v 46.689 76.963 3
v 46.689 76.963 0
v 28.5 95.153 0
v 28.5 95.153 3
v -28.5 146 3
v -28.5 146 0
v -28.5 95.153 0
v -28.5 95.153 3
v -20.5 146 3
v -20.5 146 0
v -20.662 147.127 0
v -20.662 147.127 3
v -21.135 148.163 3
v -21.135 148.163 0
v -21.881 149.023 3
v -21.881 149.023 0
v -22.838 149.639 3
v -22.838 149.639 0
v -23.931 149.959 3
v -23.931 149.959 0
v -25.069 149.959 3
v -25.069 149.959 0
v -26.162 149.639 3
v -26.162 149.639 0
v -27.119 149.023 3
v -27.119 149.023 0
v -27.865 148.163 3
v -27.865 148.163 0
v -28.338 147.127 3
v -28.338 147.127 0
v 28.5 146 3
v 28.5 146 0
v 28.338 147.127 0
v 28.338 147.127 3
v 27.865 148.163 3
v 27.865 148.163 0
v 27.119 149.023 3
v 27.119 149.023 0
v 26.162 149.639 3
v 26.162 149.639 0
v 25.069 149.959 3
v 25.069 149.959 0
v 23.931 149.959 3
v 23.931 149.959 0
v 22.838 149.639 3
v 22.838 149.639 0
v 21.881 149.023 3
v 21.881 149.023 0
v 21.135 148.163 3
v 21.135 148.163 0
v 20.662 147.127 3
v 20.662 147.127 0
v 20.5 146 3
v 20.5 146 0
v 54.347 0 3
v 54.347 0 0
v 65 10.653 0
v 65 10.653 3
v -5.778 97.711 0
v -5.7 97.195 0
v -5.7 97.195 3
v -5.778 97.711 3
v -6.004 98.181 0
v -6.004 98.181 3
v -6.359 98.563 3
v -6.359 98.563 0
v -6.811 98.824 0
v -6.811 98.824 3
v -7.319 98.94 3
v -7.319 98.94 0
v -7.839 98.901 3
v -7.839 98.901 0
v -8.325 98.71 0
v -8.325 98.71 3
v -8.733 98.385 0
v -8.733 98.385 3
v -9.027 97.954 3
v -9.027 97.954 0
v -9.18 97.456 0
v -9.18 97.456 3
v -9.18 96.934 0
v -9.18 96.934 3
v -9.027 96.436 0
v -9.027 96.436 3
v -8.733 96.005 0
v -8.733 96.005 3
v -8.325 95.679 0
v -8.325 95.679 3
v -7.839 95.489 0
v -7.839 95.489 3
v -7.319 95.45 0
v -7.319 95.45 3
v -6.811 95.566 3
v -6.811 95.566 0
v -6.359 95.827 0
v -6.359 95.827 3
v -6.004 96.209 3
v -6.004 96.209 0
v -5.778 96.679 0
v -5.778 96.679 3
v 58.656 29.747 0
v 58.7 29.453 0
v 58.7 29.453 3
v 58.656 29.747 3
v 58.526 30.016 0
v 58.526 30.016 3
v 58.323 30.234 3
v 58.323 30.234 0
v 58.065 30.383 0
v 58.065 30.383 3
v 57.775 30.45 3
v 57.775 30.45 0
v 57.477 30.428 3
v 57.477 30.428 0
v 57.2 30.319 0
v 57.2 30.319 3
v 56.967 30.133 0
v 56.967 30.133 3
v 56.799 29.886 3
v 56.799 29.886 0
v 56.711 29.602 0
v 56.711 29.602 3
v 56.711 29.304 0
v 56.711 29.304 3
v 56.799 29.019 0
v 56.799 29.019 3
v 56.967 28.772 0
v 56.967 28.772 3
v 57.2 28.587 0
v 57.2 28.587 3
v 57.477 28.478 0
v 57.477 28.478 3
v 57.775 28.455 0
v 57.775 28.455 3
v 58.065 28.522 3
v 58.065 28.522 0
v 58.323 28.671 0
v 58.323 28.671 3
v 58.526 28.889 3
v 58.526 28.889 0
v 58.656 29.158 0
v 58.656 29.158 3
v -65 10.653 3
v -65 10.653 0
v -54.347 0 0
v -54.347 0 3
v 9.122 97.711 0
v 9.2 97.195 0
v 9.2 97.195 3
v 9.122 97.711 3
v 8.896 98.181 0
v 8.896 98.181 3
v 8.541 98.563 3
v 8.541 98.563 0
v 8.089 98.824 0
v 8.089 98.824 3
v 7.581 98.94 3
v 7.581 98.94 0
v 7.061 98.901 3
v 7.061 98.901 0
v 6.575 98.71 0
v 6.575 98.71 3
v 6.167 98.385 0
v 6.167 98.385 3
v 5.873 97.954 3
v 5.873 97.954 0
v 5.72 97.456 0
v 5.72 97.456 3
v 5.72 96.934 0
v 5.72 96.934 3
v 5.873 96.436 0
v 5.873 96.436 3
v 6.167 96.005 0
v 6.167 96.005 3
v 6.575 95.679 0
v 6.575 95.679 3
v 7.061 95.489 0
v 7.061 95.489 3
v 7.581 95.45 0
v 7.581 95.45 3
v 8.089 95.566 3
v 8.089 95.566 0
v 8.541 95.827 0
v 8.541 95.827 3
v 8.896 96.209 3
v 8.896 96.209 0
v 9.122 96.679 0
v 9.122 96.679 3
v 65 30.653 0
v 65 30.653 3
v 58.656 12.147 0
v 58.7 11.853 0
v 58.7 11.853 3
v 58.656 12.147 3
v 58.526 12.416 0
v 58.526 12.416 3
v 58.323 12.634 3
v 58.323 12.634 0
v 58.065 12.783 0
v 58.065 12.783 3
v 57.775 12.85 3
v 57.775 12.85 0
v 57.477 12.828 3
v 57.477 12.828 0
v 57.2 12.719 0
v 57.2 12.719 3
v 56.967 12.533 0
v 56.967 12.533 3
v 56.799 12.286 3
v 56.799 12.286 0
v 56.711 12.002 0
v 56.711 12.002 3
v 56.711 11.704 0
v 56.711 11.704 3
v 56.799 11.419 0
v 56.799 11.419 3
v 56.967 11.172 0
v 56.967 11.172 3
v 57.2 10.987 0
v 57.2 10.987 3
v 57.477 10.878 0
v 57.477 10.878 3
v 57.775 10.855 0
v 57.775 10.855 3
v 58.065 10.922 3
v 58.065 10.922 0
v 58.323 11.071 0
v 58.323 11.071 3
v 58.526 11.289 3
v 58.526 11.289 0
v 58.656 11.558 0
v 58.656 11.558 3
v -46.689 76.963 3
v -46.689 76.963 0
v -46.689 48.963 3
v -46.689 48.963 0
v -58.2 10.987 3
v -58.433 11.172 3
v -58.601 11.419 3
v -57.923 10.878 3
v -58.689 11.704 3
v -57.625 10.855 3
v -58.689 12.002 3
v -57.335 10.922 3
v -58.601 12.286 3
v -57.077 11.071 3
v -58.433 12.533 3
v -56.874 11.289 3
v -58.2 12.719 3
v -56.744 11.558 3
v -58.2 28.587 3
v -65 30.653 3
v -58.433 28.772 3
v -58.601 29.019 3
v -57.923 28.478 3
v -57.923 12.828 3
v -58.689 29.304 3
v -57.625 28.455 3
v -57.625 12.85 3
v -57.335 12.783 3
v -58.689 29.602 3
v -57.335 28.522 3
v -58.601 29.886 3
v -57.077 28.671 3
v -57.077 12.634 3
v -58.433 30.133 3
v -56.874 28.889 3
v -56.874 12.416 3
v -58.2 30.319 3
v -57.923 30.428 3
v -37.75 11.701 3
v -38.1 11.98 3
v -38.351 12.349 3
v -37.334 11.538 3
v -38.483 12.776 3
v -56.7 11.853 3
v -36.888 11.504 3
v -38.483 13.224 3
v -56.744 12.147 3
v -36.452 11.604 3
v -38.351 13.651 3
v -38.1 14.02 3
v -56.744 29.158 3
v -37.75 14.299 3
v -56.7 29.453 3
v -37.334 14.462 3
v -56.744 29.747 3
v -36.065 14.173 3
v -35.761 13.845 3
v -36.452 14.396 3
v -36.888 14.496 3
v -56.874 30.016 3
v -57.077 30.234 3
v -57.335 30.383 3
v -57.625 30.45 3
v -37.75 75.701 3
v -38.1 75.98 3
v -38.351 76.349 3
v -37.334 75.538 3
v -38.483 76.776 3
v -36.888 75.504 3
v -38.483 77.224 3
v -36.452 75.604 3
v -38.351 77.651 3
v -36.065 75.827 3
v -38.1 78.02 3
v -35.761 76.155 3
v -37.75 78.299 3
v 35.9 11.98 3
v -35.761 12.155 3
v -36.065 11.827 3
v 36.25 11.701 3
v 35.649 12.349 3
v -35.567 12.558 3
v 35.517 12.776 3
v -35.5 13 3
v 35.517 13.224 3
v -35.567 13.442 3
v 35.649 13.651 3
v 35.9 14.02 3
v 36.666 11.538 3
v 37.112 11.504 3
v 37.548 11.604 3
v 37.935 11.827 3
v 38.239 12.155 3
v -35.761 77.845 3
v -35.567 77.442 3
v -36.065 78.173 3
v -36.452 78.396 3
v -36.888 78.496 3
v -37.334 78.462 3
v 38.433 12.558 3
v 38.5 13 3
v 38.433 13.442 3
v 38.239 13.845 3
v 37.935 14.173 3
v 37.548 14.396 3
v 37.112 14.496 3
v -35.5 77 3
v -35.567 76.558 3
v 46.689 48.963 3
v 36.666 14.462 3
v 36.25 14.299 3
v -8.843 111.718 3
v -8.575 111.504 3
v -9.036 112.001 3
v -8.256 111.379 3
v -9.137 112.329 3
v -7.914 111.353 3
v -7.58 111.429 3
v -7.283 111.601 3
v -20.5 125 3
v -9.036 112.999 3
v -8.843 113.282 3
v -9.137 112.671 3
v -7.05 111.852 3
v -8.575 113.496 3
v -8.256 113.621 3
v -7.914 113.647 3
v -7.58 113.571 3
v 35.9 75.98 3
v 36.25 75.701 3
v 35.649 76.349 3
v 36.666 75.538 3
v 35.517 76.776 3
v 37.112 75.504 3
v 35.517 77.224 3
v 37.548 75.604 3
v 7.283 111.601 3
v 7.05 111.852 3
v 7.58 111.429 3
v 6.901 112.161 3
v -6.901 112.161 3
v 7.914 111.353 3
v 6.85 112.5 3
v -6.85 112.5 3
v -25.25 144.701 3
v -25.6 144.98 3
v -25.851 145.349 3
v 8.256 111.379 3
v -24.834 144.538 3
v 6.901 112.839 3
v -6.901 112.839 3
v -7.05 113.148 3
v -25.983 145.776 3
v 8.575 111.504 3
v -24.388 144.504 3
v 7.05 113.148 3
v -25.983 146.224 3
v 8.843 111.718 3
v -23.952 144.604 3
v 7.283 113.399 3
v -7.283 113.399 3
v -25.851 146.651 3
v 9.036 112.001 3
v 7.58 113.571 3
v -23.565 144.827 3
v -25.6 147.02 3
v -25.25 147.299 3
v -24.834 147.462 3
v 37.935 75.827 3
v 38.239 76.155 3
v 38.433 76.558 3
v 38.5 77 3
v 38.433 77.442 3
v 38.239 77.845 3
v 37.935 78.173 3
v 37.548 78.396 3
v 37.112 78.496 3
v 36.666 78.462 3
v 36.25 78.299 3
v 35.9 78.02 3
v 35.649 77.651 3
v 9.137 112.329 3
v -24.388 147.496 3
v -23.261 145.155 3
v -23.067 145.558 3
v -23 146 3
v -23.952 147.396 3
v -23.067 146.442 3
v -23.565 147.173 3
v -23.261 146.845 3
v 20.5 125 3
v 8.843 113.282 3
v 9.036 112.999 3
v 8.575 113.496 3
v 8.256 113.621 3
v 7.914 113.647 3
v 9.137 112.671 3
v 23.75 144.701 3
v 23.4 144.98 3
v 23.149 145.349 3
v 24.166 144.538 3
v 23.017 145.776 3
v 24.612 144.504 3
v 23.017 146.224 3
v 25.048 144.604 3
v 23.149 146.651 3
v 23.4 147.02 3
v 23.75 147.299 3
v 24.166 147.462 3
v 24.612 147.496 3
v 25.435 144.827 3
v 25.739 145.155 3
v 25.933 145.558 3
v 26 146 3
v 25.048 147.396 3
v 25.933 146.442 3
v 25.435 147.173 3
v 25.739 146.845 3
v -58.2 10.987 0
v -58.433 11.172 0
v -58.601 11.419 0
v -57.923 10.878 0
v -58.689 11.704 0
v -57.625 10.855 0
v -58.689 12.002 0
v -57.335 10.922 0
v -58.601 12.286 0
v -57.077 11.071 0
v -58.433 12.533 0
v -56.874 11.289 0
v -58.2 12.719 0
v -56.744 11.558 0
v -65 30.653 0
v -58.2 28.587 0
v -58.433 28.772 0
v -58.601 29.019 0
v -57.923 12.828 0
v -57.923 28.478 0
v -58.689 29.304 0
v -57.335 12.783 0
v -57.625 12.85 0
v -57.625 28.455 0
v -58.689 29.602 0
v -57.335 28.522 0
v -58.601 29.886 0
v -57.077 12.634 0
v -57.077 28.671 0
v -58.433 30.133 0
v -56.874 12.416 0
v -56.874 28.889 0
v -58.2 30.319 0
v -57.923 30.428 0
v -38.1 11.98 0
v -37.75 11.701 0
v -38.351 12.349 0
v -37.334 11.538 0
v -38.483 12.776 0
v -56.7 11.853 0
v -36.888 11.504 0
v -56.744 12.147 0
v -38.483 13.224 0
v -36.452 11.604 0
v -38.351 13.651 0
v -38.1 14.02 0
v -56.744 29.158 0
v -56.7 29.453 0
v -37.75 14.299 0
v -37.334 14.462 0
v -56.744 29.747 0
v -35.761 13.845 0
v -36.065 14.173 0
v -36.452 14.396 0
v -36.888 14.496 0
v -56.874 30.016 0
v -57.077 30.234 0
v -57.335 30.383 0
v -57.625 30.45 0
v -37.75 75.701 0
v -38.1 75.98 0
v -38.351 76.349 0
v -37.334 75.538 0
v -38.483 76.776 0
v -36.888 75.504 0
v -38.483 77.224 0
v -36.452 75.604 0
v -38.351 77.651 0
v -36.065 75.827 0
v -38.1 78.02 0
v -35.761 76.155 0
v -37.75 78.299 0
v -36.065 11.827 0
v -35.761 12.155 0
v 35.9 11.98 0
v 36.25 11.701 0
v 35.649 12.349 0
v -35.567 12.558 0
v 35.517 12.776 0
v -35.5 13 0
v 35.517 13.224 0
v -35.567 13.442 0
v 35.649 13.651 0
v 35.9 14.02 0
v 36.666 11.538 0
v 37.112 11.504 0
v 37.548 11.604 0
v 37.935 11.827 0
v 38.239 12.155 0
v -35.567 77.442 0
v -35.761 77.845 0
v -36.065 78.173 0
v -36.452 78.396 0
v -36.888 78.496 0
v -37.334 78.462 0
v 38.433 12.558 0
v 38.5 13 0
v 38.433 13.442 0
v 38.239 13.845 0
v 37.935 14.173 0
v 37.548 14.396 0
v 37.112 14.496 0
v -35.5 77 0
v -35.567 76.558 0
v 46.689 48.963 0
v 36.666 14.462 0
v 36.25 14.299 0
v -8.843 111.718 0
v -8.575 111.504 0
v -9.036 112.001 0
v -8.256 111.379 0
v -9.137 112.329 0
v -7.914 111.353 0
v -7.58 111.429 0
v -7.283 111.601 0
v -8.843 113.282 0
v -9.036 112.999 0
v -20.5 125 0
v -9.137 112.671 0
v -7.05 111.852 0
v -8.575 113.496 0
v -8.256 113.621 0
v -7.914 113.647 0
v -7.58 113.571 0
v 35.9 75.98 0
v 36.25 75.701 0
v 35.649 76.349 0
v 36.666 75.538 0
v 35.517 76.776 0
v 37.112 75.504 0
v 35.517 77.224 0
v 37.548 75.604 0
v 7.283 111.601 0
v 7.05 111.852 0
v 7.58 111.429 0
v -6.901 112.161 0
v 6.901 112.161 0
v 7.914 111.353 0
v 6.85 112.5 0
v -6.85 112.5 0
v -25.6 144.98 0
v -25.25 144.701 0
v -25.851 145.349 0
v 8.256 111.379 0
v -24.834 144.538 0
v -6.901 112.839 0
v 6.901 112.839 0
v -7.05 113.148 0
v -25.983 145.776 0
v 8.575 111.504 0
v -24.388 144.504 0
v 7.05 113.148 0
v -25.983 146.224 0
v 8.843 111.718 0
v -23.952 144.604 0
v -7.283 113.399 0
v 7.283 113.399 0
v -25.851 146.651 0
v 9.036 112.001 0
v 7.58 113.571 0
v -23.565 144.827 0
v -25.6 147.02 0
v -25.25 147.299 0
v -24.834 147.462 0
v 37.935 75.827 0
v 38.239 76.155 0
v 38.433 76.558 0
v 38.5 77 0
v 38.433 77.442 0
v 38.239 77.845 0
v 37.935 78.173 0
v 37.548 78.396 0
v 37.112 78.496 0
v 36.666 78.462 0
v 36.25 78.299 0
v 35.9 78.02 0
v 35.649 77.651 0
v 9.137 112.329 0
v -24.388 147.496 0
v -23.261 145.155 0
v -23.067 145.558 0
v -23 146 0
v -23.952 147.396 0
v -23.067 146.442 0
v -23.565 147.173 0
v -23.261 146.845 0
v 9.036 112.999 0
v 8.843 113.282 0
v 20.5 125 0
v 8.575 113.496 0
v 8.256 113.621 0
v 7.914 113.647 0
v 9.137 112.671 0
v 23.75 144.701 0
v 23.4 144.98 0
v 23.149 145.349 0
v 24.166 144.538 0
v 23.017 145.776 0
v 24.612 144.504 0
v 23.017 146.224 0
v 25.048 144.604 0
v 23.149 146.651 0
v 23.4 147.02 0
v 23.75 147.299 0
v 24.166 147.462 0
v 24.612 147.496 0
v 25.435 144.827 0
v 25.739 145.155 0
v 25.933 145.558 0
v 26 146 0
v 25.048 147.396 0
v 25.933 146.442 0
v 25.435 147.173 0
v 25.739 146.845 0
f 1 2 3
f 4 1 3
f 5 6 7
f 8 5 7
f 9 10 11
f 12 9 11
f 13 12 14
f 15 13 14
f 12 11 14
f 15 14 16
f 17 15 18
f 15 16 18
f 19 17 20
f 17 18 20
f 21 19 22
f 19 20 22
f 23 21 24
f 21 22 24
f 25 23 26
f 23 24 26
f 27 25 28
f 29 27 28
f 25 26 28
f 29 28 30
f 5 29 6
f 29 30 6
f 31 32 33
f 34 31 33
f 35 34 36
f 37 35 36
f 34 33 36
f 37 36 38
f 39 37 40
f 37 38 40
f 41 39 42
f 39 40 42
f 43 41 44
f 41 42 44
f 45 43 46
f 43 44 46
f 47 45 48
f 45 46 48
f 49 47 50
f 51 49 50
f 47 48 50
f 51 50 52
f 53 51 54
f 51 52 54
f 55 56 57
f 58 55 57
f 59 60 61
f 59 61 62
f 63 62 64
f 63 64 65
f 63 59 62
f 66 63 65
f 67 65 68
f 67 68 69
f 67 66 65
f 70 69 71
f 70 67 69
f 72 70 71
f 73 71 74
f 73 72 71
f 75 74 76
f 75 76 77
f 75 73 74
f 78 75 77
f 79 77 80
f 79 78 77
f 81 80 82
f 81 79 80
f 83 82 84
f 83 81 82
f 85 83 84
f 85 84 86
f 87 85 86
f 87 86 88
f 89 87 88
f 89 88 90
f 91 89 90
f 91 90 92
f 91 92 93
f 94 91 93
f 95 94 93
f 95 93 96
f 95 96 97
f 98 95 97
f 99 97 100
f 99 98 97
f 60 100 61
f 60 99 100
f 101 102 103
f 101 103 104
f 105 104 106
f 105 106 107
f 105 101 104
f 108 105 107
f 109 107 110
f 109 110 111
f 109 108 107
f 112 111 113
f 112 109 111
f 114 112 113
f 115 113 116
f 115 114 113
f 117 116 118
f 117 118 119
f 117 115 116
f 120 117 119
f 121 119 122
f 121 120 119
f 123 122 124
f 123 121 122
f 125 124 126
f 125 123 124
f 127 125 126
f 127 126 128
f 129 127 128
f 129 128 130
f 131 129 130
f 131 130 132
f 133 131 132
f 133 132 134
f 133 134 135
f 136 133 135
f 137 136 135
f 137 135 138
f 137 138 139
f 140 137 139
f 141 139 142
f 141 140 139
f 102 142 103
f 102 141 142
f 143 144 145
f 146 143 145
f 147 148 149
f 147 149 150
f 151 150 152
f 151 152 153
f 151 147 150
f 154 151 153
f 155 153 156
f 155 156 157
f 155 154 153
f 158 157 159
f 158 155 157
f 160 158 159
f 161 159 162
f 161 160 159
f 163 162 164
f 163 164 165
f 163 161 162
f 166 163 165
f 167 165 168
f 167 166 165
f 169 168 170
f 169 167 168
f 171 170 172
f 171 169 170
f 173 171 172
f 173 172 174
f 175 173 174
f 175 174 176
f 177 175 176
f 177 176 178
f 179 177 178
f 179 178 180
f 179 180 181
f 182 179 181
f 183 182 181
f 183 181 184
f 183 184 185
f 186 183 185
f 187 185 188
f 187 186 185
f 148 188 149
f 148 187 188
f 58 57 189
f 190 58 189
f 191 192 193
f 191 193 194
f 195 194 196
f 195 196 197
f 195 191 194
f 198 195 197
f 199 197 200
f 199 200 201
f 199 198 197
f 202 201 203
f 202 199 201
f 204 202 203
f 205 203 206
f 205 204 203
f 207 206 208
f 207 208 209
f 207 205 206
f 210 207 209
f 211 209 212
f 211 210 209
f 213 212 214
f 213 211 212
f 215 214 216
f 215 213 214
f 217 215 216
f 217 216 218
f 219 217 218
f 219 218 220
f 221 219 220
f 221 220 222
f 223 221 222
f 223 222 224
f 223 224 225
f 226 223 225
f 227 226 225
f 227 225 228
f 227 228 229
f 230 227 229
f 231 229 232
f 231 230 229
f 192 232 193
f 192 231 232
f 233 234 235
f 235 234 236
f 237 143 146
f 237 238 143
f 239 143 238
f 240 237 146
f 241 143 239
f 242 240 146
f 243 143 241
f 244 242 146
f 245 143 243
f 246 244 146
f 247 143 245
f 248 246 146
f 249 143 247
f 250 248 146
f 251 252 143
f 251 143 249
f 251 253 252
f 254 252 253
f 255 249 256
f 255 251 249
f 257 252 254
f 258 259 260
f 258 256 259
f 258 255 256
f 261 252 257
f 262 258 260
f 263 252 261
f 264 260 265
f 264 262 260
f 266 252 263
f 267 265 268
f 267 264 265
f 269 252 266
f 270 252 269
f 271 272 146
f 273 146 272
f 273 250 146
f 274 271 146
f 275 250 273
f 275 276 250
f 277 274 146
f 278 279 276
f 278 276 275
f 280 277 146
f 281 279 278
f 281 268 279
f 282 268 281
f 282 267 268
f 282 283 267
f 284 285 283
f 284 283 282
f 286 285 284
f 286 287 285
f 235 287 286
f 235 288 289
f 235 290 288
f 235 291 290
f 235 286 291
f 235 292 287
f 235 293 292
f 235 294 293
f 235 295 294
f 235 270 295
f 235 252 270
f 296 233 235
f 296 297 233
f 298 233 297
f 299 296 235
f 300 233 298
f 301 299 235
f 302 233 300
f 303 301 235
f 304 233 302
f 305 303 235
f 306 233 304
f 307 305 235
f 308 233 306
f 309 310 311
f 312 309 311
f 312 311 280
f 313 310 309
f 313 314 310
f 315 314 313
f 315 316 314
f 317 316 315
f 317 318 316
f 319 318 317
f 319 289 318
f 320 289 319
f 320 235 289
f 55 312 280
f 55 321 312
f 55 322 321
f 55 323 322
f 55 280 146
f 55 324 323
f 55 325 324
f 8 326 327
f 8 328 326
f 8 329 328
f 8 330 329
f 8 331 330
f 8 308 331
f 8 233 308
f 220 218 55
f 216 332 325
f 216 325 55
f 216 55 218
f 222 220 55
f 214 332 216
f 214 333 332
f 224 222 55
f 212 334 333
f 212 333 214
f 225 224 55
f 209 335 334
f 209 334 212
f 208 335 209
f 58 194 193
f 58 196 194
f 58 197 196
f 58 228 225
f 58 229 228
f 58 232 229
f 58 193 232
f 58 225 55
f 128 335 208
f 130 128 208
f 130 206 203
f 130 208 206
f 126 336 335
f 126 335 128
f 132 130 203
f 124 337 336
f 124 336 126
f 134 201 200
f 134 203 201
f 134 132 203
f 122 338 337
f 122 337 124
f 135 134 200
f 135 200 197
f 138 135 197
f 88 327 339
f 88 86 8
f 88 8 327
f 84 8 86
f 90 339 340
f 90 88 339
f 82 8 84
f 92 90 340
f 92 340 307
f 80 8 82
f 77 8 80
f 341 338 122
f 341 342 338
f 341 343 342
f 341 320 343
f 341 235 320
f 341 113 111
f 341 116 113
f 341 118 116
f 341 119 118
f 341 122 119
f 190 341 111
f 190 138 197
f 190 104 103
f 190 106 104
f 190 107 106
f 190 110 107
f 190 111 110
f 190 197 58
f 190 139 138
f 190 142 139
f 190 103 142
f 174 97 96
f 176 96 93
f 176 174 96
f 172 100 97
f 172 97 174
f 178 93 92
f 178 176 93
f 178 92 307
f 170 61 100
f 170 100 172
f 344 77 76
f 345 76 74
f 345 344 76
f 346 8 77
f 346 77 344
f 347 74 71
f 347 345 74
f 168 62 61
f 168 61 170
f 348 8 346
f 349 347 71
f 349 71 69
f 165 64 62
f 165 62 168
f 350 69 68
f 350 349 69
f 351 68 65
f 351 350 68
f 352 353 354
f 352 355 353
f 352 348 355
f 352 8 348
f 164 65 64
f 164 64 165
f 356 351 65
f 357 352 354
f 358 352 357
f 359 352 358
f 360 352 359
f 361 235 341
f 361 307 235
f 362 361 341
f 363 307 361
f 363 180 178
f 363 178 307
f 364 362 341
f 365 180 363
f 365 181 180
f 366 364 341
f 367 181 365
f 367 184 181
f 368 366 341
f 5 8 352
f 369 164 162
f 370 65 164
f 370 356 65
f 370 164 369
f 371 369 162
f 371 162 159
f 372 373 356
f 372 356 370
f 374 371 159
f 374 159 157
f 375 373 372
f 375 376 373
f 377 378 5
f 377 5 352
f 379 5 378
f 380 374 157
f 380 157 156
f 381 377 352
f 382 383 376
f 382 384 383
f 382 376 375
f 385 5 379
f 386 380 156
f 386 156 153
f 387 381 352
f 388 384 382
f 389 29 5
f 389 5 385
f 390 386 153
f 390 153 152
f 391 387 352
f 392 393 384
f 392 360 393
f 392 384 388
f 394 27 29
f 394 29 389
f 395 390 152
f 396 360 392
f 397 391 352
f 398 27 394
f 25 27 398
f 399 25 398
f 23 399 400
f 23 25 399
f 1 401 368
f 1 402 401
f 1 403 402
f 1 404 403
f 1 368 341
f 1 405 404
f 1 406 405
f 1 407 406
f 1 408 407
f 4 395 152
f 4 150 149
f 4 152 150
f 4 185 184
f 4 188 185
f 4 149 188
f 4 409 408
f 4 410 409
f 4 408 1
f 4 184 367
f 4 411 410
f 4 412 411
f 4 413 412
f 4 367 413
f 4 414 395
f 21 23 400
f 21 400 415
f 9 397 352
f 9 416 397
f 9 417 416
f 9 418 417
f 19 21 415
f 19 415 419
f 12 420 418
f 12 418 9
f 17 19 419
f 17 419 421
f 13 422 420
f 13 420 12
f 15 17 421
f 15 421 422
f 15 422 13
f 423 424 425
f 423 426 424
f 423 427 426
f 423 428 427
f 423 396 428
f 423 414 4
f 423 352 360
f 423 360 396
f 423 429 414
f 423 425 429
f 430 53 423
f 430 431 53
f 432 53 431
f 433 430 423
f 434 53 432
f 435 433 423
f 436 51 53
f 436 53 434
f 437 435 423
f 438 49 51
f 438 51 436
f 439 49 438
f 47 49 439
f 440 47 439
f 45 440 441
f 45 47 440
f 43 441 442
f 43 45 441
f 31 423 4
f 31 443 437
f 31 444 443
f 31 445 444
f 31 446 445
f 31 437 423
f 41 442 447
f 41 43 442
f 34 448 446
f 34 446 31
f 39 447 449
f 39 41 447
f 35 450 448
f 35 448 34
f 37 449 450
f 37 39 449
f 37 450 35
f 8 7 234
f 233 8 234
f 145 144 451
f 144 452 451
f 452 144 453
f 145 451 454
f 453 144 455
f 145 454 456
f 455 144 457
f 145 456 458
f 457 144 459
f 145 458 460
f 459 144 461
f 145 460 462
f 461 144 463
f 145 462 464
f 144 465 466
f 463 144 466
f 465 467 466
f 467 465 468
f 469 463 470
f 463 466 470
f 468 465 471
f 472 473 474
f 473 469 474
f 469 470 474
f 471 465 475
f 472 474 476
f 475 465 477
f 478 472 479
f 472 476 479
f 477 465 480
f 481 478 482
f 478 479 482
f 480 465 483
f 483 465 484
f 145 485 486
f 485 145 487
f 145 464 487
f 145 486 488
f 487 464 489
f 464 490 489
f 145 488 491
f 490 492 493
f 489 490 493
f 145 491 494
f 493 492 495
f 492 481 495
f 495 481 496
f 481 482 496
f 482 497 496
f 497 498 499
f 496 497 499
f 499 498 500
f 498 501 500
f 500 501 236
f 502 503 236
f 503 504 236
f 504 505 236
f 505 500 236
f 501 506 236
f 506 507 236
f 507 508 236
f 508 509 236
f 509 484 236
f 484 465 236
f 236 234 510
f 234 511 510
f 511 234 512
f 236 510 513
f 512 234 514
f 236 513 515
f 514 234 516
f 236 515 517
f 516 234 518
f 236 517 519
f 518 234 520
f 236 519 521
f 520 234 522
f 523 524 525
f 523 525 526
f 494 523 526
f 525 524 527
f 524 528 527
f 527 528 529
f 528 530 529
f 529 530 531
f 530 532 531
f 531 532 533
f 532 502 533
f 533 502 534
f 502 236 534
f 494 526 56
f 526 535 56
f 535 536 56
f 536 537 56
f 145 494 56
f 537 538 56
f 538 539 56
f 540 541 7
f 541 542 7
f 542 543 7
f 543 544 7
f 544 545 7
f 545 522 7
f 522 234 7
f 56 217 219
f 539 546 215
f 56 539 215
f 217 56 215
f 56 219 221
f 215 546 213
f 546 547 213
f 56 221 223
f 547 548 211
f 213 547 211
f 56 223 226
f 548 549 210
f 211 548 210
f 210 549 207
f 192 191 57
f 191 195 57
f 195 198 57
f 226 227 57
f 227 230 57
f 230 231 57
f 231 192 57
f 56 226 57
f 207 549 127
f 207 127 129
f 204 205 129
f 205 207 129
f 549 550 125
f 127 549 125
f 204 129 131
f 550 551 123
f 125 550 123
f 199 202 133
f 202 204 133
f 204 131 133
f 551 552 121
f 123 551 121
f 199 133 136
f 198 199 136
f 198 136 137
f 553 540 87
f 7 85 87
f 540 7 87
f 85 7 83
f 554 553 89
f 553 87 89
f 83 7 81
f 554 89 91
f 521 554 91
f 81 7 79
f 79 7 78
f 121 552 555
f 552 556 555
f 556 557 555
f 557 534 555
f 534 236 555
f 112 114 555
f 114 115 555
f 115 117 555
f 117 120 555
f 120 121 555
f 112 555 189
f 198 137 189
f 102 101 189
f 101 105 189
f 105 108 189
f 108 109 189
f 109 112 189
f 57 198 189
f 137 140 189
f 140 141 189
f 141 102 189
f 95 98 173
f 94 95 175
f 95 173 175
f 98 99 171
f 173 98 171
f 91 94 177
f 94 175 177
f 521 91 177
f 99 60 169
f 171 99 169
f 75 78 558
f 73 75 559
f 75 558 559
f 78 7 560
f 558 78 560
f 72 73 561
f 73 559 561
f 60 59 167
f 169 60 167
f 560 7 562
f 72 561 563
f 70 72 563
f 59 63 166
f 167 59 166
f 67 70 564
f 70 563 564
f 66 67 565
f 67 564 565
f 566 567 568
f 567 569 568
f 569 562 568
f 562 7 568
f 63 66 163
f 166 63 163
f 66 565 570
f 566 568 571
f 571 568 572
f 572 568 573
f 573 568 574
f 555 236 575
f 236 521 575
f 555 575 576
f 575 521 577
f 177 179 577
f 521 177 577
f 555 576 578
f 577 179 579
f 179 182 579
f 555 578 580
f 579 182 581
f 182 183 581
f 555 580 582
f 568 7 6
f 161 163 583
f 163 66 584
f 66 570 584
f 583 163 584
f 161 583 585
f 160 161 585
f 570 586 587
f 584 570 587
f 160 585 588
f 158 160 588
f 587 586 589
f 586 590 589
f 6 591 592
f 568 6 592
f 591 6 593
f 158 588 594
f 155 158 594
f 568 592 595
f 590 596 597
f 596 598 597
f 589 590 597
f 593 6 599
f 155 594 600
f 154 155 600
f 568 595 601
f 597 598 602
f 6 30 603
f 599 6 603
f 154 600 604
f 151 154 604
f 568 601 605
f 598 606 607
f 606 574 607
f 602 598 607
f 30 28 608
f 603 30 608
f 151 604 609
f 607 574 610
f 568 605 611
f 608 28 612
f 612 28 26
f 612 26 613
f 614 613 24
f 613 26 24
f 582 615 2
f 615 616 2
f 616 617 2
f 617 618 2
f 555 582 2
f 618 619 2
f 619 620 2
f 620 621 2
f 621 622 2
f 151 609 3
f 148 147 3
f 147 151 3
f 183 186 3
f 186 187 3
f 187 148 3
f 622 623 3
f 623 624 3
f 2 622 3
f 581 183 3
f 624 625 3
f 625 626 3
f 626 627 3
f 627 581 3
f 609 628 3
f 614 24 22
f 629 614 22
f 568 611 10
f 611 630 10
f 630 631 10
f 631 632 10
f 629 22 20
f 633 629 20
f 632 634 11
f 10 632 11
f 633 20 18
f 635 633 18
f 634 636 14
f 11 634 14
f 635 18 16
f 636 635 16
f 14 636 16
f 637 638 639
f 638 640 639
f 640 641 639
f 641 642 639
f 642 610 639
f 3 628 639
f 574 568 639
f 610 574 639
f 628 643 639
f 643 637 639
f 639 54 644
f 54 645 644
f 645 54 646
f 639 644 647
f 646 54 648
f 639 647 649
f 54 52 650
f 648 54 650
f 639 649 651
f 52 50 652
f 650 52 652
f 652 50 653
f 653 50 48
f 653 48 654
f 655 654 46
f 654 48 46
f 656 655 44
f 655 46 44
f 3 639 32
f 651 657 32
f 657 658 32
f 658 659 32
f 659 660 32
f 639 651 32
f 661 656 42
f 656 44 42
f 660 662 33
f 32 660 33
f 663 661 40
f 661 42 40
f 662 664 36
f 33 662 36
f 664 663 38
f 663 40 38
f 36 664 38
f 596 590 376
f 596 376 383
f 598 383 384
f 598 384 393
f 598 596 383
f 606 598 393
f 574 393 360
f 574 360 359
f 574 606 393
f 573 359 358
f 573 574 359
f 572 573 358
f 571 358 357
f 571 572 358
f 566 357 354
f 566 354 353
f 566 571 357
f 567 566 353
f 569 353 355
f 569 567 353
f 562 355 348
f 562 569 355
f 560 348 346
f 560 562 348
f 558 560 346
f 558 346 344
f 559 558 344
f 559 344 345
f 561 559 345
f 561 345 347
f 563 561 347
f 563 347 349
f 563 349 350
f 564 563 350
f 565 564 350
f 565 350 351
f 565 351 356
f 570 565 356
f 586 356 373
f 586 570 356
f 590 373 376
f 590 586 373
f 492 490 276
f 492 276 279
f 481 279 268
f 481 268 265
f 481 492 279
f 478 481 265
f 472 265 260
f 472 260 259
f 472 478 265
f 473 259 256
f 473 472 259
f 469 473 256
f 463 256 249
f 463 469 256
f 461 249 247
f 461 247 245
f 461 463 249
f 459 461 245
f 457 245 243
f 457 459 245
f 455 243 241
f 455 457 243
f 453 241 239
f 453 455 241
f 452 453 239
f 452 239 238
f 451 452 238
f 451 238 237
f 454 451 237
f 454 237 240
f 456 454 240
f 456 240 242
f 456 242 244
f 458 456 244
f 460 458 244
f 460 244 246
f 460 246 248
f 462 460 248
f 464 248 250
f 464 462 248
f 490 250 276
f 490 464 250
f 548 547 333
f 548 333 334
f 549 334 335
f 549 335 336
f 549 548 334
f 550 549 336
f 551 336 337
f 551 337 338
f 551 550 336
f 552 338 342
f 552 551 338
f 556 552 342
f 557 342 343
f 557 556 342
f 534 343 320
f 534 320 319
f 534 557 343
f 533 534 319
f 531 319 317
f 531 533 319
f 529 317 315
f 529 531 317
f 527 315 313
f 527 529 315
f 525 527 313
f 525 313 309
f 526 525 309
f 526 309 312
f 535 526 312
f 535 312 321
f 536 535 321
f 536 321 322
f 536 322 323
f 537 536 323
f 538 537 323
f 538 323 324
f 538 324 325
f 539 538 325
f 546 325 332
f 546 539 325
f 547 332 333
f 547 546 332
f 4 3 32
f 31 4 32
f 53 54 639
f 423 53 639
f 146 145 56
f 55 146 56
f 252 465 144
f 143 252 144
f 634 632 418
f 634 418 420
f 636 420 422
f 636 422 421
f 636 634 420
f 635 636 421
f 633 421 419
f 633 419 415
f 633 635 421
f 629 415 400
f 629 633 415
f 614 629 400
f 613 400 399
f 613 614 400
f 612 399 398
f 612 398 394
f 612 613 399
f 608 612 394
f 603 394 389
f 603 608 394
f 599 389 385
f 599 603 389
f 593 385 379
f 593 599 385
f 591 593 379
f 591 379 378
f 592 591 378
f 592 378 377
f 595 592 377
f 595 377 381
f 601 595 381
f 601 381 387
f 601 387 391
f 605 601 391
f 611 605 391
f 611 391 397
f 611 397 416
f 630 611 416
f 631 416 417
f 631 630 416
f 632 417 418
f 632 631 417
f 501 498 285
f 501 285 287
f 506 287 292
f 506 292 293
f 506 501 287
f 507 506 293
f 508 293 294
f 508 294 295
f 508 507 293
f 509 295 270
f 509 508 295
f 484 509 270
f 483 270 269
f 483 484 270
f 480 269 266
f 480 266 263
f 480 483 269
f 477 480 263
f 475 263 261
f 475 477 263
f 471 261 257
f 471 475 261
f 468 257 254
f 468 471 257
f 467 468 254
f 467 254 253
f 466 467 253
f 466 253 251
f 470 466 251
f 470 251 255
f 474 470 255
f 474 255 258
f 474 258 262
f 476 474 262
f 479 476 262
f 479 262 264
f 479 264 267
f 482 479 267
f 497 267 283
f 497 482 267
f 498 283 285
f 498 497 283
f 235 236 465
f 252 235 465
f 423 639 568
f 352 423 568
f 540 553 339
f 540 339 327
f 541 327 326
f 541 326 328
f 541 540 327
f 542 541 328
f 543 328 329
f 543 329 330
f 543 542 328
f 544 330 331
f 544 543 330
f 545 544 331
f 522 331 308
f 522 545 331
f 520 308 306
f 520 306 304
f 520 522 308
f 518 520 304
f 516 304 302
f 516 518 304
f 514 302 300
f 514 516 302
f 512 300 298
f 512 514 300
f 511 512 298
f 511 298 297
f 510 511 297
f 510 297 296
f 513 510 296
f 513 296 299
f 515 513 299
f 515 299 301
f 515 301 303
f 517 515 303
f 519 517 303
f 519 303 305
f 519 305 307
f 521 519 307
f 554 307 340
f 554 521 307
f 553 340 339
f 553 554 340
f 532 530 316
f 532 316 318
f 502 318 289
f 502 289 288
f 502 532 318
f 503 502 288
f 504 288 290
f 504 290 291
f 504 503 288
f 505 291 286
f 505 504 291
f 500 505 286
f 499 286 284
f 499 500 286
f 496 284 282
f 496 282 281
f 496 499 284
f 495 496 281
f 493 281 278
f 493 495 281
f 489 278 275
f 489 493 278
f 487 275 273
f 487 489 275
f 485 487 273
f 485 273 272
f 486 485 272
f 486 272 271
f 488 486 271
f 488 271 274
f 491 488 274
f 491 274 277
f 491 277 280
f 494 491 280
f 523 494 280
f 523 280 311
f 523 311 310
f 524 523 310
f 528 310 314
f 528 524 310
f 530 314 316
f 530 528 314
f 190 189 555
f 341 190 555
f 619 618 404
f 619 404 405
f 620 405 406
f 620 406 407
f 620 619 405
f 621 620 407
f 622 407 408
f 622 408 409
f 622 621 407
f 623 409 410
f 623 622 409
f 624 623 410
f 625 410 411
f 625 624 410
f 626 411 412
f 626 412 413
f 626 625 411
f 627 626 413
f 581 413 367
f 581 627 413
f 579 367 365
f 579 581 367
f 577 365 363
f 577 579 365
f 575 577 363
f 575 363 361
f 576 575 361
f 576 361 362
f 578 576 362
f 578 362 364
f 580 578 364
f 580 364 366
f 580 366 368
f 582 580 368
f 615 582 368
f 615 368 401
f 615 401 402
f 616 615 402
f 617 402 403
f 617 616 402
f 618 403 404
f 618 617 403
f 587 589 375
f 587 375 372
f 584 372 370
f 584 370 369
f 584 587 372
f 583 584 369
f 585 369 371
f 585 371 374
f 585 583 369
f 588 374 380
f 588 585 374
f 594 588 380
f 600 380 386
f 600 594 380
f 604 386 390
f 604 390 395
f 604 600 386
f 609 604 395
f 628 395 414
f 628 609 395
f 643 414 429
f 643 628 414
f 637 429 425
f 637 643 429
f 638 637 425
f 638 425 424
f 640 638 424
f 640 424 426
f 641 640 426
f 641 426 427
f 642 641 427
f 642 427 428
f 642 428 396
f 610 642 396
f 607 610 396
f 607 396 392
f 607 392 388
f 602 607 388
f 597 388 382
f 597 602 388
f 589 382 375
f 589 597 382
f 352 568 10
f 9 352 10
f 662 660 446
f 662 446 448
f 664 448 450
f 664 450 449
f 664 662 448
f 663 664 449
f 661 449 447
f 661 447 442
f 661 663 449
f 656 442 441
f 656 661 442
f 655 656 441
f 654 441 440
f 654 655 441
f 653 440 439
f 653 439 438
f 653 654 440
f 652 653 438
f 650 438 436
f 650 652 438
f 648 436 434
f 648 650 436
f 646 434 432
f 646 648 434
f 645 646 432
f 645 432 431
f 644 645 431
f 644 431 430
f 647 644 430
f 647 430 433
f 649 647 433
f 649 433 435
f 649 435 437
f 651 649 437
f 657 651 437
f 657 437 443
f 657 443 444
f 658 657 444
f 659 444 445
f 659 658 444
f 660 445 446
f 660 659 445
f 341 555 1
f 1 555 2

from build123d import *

# Parameters (mm, degrees)
MODEL_R         = 1.75
MODEL_R_2       = 1.15
MODEL_R_3       = 1.5
MODEL_R_4       = 1
EXTRUDE_1_DEPTH = 3


with BuildPart() as part:
    # Model → 凸台-拉伸1 (new body)
    with BuildSketch(Plane.XY):
        with BuildLine():
            Line((-46.68918008, 48.963412214), (-65, 30.652592295))
            Line((-65, 30.652592295), (-65, 10.652592295))
            Line((-65, 10.652592295), (-54.347407705, 0))
            Line((-54.347407705, 0), (54.347407705, 0))
            Line((54.347407705, 0), (65, 10.652592295))
            Line((65, 10.652592295), (65, 30.652592295))
            Line((65, 30.652592295), (46.68918008, 48.963412214))
            Line((46.68918008, 48.963412214), (46.68918008, 76.963412214))
            Line((46.68918008, 76.963412214), (28.5, 95.152592295))
            Line((28.5, 95.152592295), (28.5, 146))
            ThreePointArc((28.5, 146), (24.5, 150), (20.5, 146))
            Line((20.5, 146), (20.5, 125))
            Line((20.5, 125), (-20.5, 125))
            Line((-20.5, 125), (-20.5, 146))
            ThreePointArc((-20.5, 146), (-24.5, 150), (-28.5, 146))
            Line((-28.5, 146), (-28.5, 95.152592295))
            Line((-28.5, 95.152592295), (-46.68918008, 76.963412214))
            Line((-46.68918008, 76.963412214), (-46.68918008, 48.963412214))
        make_face()
        with Locations((7.45, 97.194870059)):
            Circle(MODEL_R, mode=Mode.SUBTRACT)
        with Locations(Location((8, 112.5, 0), (0, 0, 180))):
            Circle(MODEL_R_2, mode=Mode.SUBTRACT)
        with Locations((-24.5, 146)):
            Circle(MODEL_R_3, mode=Mode.SUBTRACT)
        with Locations((37, 13)):
            Circle(MODEL_R_3, mode=Mode.SUBTRACT)
        with Locations((37, 77)):
            Circle(MODEL_R_3, mode=Mode.SUBTRACT)
        with Locations((57.7, 11.852592295)):
            Circle(MODEL_R_4, mode=Mode.SUBTRACT)
        with Locations((-57.7, 11.852592295)):
            Circle(MODEL_R_4, mode=Mode.SUBTRACT)
        with Locations((-57.7, 29.452592295)):
            Circle(MODEL_R_4, mode=Mode.SUBTRACT)
        with Locations((57.7, 29.452592295)):
            Circle(MODEL_R_4, mode=Mode.SUBTRACT)
        with Locations((-37, 77)):
            Circle(MODEL_R_3, mode=Mode.SUBTRACT)
        with Locations((-37, 13)):
            Circle(MODEL_R_3, mode=Mode.SUBTRACT)
        with Locations((24.5, 146)):
            Circle(MODEL_R_3, mode=Mode.SUBTRACT)
        with Locations((-8, 112.5)):
            Circle(MODEL_R_2, mode=Mode.SUBTRACT)
        with Locations((-7.45, 97.194870059)):
            Circle(MODEL_R, mode=Mode.SUBTRACT)
    extrude(amount=EXTRUDE_1_DEPTH)


solid = part.part
